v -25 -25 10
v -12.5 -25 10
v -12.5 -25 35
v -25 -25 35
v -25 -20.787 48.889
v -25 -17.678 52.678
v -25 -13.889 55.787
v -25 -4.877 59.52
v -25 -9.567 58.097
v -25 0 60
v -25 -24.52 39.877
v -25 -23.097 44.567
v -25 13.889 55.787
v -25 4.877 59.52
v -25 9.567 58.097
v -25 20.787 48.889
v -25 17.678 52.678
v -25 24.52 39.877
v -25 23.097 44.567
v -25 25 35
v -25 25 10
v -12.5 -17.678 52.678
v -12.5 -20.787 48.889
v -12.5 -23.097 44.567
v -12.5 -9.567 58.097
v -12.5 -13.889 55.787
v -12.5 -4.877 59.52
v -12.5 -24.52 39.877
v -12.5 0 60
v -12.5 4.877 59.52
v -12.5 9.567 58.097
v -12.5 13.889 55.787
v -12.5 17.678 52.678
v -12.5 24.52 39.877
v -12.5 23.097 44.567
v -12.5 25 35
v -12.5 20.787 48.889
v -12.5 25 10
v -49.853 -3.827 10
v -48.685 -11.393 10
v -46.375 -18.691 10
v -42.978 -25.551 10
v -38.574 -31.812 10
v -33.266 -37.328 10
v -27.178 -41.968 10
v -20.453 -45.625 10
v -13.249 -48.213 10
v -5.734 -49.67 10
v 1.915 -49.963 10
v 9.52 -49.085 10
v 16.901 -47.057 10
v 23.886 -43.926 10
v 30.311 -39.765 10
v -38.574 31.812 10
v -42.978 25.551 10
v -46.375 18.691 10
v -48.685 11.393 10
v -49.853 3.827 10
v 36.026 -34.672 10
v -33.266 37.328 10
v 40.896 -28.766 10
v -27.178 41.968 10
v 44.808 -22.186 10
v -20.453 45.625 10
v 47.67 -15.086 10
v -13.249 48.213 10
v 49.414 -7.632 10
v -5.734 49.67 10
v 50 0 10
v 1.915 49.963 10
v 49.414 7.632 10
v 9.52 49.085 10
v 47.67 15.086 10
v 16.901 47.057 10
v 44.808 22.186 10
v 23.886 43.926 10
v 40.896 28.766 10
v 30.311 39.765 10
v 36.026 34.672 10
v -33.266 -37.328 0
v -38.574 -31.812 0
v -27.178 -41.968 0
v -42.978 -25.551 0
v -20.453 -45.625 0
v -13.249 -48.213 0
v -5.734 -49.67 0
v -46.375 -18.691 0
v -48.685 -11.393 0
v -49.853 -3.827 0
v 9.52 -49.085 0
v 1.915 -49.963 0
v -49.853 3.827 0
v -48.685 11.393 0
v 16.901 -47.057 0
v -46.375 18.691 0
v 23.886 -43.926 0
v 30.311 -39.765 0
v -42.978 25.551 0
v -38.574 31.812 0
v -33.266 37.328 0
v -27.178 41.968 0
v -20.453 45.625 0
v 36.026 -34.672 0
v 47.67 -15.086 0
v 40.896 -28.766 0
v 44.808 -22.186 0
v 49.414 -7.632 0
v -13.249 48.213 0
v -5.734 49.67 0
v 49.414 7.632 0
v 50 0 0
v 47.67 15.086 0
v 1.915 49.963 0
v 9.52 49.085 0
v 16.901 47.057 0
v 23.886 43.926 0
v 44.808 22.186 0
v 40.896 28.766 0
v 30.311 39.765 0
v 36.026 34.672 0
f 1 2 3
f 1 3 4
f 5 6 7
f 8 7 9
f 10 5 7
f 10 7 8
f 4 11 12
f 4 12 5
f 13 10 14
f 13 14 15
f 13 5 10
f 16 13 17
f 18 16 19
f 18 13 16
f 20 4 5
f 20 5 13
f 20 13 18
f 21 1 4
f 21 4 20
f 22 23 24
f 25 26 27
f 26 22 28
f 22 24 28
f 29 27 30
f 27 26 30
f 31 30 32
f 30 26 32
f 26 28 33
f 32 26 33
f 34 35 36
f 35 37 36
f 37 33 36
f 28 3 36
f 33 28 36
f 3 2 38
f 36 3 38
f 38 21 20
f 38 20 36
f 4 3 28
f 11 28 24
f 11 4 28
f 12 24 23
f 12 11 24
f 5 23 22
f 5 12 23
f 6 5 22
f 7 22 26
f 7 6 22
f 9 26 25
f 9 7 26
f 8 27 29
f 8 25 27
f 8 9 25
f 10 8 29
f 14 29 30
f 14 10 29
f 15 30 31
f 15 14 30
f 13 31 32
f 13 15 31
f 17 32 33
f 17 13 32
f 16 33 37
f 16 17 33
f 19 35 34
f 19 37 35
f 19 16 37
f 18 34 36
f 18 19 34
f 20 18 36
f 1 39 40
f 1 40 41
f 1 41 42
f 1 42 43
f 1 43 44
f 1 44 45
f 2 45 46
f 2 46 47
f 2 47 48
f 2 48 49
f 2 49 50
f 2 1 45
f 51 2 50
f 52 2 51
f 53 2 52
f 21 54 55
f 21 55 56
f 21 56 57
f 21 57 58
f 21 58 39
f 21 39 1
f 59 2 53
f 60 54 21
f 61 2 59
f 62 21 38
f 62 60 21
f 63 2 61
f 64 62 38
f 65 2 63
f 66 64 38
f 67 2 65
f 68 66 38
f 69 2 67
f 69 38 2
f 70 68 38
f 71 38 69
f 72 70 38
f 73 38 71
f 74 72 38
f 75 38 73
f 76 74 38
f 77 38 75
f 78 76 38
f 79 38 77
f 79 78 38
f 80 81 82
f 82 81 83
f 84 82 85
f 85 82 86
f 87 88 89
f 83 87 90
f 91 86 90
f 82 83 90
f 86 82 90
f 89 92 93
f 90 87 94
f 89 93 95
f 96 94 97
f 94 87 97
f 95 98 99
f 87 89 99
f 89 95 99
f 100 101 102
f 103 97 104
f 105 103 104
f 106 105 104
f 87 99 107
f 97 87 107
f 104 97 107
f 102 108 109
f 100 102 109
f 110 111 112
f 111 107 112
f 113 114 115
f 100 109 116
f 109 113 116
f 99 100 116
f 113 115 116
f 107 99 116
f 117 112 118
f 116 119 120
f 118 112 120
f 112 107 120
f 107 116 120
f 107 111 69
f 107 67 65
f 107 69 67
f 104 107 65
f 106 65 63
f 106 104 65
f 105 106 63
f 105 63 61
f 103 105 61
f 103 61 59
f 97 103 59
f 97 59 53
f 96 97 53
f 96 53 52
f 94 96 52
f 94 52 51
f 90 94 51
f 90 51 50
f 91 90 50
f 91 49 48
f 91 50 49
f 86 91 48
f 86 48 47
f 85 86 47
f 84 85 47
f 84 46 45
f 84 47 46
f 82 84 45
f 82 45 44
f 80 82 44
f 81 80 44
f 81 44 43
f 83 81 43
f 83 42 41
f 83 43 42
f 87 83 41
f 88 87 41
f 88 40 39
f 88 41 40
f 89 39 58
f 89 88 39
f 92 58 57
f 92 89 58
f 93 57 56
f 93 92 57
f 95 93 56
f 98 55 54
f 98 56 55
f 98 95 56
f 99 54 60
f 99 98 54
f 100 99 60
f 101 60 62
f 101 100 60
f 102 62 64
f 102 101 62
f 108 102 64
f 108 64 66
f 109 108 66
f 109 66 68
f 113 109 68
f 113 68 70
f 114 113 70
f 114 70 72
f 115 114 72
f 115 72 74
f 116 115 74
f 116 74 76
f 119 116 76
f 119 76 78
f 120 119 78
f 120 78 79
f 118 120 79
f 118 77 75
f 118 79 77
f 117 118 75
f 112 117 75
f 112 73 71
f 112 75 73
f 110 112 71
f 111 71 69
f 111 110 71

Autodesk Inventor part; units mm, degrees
ref_plane "YZ Plane" through (0, 0, 0) normal (1, 0, 0) x (0, 1, 0)
ref_plane "XZ Plane" through (0, 0, 0) normal (0, 1, 0) x (-1, 0, 0)
ref_plane "XY Plane" through (0, 0, 0) normal (0, 0, 1) x (1, 0, 0)
sketch "Szkic1" plane through (0, 0, 0) normal (0, 0, 1) x (1, 0, 0)
  circle A0 centre (0, 0) radius 50
  line L0 (-25, 25) -> (-12.5, 25)
  line L1 (-12.5, -25) -> (-25, -25)
  line L2 (-25, -25) -> (-25, 25)
  line L3 (-12.5, -25) -> (-12.5, 25)
  point P0 (-12.5, 0)
  point P1 (-18.75, 25)
  dimension "d0" = 100
  dimension "d10" = 12.5
  dimension "d11" = 12.5
  dimension "d12" = 50
  dimension "d13" = 25
extrude "Wyciągnięcie proste1" add sketch "Szkic1" along normal blind 60 contours L0 L3 L1 L2
extrude "Wyciągnięcie proste2" add sketch "Szkic1" along normal blind 10 contours A0 | L0 L3 L1 L2
sketch "Szkic2" plane through (-25, -25, 60) normal (-1, 0, 0) x (0, 0, 1)
  line L0 (-50, 50) -> (-50, 0) projected
  line L1 (-50, 0) -> (0, 0) projected
  line L2 (0, 50) -> (0, 0) projected
  line L3 (-50, 50) -> (0, 50) projected
  circle A0 centre (-25, 25) radius 25
  line L4 (-50, 50) -> (0, 50) projected
  line L5 (0, 50) -> (0, 0) projected
  line L6 (-25, 50) -> (0, 50)
  line L7 (0, 25) -> (0, 0)
  point P0 (-60, 25)
  point P1 (-25, 50)
  point P2 (0, 25)
  point P3 (-25, 0)
  dimension "d7" = 50
extrude "Wyciągnięcie proste3" cut sketch "Szkic2" against normal through all contours L3 L2 A0 | A0 L2 L1
properties part number "podstawa"
